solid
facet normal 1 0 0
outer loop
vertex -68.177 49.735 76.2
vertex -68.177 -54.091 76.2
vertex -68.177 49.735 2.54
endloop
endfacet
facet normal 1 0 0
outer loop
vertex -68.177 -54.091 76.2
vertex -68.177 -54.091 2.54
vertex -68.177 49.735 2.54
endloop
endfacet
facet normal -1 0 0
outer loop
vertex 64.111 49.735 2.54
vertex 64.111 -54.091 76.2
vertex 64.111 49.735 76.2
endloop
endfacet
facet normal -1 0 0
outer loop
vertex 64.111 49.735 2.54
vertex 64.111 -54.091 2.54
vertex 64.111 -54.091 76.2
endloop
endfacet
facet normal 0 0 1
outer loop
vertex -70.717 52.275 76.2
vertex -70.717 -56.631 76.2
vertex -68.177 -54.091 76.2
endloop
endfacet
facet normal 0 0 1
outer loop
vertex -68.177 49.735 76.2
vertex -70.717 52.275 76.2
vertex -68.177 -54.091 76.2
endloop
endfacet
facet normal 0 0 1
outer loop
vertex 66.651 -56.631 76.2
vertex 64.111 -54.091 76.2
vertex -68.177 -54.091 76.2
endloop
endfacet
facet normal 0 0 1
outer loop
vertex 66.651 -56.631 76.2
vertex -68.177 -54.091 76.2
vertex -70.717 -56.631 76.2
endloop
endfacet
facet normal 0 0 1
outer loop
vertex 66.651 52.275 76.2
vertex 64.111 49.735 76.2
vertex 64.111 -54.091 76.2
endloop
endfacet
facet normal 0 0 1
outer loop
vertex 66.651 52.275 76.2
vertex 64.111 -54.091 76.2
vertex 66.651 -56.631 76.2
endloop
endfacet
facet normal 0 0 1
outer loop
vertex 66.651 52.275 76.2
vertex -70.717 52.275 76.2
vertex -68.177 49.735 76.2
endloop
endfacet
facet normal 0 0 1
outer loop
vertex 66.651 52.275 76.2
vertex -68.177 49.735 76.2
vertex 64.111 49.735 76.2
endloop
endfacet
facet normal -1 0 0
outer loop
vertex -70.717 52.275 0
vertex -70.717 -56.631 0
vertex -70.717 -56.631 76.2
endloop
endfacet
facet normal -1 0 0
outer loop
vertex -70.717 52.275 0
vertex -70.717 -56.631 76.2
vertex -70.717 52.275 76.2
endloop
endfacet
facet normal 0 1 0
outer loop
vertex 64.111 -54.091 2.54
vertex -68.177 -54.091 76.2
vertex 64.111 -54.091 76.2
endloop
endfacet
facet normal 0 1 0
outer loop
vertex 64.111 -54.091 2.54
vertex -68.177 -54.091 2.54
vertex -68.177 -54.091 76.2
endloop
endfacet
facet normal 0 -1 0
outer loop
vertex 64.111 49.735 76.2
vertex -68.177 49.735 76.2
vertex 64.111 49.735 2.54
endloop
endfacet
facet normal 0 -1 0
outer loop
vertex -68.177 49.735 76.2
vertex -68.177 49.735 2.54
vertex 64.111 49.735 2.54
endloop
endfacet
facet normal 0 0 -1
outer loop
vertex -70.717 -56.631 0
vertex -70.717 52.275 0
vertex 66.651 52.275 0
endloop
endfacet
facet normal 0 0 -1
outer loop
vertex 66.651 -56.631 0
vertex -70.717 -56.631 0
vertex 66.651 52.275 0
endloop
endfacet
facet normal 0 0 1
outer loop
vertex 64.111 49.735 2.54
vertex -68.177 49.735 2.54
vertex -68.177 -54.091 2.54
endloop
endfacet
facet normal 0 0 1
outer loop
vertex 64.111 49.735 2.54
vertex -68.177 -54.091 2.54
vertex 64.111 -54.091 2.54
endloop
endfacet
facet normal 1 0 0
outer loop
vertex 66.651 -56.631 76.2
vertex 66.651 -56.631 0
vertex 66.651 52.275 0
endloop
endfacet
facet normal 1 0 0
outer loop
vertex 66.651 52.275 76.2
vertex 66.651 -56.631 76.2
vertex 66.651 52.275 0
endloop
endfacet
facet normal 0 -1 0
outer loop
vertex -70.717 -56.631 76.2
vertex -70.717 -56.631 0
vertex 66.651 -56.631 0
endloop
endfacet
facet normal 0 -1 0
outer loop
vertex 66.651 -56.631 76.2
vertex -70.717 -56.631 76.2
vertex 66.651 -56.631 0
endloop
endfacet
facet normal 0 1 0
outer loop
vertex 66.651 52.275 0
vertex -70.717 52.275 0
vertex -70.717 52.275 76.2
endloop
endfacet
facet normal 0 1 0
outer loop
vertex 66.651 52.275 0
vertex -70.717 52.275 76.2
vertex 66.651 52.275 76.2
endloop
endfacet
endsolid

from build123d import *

# Parameters (mm, degrees)
F0_W     = 137.367442
F0_H     = 108.906533
F1_DEPTH = 76.2
F2_T     = -2.54


with BuildPart() as f1:
    # F0 (on Top) → F1 (new body)
    with BuildSketch(Plane.XY):
        with Locations((-2.032921, -2.178131)):
            Rectangle(F0_W, F0_H)
    extrude(amount=F1_DEPTH)

    # F2
    f2_openings = [f1.faces().sort_by_distance(p)[0] for p in [
        (-2.032921, -2.178131, 76.2),
    ]]
    offset(amount=F2_T, openings=f2_openings)


solid = f1.part
